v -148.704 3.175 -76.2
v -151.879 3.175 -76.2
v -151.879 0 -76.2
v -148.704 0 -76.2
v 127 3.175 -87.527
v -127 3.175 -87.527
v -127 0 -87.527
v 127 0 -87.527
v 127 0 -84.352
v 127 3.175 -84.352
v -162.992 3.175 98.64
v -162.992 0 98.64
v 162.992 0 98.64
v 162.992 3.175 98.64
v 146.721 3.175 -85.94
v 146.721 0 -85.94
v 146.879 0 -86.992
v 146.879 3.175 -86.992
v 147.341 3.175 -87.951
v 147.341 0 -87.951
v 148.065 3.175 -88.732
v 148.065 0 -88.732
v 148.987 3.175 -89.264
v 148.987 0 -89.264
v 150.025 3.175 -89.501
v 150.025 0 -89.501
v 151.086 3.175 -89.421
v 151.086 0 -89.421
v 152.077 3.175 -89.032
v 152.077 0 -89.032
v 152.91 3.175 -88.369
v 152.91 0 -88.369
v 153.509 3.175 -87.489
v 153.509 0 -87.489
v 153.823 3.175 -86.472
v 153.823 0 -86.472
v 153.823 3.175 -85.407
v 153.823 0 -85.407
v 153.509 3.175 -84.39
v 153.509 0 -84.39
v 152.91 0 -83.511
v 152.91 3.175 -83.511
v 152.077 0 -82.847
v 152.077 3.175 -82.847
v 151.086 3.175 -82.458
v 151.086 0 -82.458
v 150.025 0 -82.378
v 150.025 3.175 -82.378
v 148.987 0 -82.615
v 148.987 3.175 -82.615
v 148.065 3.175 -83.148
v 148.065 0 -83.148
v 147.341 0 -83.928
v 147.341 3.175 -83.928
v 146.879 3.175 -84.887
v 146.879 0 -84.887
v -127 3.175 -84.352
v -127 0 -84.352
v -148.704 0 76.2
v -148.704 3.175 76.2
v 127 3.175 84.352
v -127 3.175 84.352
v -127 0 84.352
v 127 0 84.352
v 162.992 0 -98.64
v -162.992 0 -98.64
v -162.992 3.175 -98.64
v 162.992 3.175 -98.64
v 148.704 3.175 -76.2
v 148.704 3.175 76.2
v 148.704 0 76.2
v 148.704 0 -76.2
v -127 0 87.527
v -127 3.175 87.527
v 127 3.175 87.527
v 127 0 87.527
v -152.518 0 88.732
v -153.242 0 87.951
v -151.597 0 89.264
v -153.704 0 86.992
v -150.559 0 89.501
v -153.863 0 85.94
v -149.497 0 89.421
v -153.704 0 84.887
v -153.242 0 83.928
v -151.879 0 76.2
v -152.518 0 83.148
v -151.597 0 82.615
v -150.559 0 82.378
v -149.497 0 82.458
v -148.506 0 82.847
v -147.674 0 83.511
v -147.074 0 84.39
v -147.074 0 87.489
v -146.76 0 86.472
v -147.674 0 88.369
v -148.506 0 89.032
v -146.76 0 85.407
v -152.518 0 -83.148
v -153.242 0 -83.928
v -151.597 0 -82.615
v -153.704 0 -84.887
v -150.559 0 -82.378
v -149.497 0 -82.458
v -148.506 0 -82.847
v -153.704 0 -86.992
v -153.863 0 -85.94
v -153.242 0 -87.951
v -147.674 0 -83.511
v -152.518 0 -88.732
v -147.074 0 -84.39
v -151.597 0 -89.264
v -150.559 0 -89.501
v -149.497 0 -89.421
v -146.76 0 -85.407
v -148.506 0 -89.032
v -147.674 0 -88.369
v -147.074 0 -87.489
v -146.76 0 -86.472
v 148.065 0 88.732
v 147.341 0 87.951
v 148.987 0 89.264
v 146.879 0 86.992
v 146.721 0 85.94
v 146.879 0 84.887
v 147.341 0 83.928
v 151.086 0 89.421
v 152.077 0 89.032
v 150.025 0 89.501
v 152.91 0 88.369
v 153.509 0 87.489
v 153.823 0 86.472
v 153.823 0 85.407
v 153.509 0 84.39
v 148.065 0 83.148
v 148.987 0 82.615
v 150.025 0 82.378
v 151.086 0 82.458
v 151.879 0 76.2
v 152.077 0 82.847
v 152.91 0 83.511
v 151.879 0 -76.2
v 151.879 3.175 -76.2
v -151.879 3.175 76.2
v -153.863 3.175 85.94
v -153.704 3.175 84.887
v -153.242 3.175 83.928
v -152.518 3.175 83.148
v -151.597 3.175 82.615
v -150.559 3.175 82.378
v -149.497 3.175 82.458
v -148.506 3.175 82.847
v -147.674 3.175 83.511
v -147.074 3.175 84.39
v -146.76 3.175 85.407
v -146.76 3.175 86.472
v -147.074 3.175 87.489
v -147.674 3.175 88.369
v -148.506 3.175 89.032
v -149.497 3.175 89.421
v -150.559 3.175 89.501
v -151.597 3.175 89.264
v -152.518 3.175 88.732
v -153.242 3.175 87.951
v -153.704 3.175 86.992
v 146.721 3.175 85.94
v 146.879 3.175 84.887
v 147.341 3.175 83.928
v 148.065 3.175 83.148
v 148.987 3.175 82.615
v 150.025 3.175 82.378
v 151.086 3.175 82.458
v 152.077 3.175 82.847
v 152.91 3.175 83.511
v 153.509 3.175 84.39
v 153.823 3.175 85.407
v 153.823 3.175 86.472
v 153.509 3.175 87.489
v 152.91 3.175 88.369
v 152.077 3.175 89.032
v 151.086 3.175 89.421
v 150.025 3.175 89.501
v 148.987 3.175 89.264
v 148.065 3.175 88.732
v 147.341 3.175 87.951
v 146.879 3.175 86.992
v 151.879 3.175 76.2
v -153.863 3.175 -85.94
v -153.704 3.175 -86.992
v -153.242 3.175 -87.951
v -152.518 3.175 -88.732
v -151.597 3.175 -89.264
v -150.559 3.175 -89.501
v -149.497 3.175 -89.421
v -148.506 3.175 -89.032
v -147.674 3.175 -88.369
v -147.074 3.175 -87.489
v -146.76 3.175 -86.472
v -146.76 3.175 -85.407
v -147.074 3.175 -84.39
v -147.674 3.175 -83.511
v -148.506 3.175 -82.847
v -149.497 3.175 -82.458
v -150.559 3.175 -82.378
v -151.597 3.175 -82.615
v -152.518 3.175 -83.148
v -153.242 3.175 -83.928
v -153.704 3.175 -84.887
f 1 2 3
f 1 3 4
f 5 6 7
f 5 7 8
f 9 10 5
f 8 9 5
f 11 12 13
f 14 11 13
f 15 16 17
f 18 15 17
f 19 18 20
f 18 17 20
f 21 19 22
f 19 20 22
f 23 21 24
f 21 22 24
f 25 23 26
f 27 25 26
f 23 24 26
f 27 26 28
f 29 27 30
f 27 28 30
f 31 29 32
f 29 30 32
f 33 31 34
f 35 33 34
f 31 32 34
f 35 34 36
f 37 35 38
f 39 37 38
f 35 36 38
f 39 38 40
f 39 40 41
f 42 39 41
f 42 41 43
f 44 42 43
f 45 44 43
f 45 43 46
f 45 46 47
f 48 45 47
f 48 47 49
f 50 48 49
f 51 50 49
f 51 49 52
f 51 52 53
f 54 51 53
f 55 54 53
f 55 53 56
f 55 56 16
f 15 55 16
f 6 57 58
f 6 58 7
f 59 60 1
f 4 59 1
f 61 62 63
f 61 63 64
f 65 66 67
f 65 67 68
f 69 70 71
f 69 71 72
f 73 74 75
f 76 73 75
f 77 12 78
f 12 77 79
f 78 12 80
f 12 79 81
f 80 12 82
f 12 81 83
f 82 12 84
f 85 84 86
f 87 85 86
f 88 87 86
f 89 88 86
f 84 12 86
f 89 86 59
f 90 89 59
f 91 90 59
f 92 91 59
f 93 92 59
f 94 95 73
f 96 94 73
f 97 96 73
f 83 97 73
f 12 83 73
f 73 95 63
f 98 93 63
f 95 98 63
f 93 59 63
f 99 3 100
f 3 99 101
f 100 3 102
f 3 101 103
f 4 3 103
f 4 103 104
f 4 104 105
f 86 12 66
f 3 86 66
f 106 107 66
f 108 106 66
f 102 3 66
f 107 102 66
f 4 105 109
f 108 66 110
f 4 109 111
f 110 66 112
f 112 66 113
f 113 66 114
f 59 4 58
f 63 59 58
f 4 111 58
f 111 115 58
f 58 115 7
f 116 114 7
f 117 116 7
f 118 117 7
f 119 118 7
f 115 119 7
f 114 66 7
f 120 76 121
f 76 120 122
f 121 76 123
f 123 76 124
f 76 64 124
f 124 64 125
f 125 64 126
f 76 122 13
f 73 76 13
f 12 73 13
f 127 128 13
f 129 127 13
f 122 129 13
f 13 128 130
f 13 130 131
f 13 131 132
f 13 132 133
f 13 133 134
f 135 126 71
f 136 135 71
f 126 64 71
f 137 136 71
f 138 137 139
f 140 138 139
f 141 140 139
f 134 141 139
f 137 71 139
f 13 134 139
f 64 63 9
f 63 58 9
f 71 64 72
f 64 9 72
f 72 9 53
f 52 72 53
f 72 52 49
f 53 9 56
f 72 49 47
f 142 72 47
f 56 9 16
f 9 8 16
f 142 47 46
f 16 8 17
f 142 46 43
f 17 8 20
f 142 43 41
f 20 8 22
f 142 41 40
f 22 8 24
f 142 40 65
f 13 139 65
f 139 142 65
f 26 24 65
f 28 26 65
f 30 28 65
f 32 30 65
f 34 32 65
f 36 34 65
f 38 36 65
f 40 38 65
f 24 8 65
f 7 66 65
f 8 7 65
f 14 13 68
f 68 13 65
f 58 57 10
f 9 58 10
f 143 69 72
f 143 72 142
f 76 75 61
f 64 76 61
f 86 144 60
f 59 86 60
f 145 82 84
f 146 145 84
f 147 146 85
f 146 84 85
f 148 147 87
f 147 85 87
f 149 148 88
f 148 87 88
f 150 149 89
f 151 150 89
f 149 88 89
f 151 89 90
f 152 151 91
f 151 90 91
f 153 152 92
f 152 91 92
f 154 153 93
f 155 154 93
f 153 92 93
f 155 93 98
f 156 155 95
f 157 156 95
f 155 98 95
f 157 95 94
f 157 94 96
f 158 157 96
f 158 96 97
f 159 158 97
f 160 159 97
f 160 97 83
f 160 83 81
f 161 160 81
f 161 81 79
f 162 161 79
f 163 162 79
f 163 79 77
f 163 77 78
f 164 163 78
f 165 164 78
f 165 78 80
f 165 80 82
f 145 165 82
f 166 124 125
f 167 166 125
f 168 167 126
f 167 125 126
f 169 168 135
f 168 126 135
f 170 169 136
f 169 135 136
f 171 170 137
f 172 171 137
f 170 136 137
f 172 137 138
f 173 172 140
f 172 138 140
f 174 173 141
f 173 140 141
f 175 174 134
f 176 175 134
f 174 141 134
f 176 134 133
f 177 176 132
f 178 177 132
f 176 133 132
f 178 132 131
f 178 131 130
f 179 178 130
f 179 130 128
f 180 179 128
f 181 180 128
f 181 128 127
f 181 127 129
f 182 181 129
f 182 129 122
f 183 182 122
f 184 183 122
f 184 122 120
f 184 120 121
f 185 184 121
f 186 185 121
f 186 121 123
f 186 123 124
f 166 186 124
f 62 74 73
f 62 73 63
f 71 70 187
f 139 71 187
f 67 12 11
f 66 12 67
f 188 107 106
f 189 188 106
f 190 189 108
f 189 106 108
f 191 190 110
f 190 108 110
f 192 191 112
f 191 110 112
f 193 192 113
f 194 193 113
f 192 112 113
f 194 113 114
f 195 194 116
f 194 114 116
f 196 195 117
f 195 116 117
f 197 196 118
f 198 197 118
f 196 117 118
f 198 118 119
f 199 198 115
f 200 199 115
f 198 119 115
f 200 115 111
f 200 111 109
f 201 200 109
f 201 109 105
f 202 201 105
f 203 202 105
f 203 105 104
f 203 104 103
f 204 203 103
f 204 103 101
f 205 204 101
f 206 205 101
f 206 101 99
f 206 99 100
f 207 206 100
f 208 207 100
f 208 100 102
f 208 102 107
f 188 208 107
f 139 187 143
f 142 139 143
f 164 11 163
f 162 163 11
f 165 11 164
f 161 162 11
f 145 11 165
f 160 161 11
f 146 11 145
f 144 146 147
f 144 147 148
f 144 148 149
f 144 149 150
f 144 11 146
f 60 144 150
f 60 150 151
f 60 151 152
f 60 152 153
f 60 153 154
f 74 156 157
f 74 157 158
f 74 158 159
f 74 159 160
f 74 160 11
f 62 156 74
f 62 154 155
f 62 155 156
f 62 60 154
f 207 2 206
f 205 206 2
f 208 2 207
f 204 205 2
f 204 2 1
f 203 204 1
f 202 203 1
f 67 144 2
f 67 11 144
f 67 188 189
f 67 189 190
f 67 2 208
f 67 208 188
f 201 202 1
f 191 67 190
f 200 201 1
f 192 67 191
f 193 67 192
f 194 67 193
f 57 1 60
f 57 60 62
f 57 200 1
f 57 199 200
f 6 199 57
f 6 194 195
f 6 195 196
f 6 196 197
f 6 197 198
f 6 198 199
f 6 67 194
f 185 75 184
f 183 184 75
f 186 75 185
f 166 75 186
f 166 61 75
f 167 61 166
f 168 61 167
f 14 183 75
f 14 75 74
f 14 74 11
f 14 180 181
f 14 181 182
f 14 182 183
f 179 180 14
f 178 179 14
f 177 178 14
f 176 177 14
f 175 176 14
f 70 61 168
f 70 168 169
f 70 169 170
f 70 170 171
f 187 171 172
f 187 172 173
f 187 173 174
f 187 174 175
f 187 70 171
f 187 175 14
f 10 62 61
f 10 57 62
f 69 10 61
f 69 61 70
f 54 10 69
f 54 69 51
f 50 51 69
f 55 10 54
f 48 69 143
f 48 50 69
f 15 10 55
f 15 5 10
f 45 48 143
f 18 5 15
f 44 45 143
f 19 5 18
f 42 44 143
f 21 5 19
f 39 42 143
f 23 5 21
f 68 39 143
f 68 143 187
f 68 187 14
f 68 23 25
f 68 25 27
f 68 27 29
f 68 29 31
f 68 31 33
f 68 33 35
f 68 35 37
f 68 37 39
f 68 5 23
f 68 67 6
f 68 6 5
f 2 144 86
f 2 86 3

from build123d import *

# Parameters (mm, degrees)
SKETCH1_W               = 325.9836
SKETCH1_H               = 197.27926
BOSS_EXTRUDE1_DEPTH     = 3.175
F_1_4_CLEARANCE_HOLE1_D = 7.14248
SKETCH4_W               = 3.175
SKETCH4_H               = 152.4
SKETCH4_W_2             = 254
SKETCH4_H_2             = 3.175
CUT_EXTRUDE1_DEPTH      = 191.541817192


with BuildPart() as part:
    # Sketch1 → Boss-Extrude1 (new body)
    with BuildSketch(Plane(origin=(0, 0, 0), x_dir=(1, 0, 0), z_dir=(0, 1, 0))):
        Rectangle(SKETCH1_W, SKETCH1_H)
    extrude(amount=BOSS_EXTRUDE1_DEPTH)

    # 1/4 Clearance Hole1 (through all)
    with Locations(Plane(origin=(0, 3.175, 0), x_dir=(1, 0, 0), z_dir=(0, 1, 0))):
        with Locations((-150.2918, 85.93963), (150.2918, 85.93963), (150.2918, -85.93963), (-150.2918, -85.93963)):
            Hole(F_1_4_CLEARANCE_HOLE1_D / 2)

    # Sketch4 → Cut-Extrude1 (cut, through all)
    with BuildSketch(Plane(origin=(0, 3.175, 0), x_dir=(1, 0, 0), z_dir=(0, 1, 0))):
        with Locations((-150.2918, 0)):
            Rectangle(SKETCH4_W, SKETCH4_H)
        with Locations((150.2918, 0)):
            Rectangle(SKETCH4_W, SKETCH4_H)
        with Locations((0, 85.93963)):
            Rectangle(SKETCH4_W_2, SKETCH4_H_2)
        with Locations((0, -85.93963)):
            Rectangle(SKETCH4_W_2, SKETCH4_H_2)
    extrude(amount=-CUT_EXTRUDE1_DEPTH, mode=Mode.SUBTRACT)


solid = part.part
